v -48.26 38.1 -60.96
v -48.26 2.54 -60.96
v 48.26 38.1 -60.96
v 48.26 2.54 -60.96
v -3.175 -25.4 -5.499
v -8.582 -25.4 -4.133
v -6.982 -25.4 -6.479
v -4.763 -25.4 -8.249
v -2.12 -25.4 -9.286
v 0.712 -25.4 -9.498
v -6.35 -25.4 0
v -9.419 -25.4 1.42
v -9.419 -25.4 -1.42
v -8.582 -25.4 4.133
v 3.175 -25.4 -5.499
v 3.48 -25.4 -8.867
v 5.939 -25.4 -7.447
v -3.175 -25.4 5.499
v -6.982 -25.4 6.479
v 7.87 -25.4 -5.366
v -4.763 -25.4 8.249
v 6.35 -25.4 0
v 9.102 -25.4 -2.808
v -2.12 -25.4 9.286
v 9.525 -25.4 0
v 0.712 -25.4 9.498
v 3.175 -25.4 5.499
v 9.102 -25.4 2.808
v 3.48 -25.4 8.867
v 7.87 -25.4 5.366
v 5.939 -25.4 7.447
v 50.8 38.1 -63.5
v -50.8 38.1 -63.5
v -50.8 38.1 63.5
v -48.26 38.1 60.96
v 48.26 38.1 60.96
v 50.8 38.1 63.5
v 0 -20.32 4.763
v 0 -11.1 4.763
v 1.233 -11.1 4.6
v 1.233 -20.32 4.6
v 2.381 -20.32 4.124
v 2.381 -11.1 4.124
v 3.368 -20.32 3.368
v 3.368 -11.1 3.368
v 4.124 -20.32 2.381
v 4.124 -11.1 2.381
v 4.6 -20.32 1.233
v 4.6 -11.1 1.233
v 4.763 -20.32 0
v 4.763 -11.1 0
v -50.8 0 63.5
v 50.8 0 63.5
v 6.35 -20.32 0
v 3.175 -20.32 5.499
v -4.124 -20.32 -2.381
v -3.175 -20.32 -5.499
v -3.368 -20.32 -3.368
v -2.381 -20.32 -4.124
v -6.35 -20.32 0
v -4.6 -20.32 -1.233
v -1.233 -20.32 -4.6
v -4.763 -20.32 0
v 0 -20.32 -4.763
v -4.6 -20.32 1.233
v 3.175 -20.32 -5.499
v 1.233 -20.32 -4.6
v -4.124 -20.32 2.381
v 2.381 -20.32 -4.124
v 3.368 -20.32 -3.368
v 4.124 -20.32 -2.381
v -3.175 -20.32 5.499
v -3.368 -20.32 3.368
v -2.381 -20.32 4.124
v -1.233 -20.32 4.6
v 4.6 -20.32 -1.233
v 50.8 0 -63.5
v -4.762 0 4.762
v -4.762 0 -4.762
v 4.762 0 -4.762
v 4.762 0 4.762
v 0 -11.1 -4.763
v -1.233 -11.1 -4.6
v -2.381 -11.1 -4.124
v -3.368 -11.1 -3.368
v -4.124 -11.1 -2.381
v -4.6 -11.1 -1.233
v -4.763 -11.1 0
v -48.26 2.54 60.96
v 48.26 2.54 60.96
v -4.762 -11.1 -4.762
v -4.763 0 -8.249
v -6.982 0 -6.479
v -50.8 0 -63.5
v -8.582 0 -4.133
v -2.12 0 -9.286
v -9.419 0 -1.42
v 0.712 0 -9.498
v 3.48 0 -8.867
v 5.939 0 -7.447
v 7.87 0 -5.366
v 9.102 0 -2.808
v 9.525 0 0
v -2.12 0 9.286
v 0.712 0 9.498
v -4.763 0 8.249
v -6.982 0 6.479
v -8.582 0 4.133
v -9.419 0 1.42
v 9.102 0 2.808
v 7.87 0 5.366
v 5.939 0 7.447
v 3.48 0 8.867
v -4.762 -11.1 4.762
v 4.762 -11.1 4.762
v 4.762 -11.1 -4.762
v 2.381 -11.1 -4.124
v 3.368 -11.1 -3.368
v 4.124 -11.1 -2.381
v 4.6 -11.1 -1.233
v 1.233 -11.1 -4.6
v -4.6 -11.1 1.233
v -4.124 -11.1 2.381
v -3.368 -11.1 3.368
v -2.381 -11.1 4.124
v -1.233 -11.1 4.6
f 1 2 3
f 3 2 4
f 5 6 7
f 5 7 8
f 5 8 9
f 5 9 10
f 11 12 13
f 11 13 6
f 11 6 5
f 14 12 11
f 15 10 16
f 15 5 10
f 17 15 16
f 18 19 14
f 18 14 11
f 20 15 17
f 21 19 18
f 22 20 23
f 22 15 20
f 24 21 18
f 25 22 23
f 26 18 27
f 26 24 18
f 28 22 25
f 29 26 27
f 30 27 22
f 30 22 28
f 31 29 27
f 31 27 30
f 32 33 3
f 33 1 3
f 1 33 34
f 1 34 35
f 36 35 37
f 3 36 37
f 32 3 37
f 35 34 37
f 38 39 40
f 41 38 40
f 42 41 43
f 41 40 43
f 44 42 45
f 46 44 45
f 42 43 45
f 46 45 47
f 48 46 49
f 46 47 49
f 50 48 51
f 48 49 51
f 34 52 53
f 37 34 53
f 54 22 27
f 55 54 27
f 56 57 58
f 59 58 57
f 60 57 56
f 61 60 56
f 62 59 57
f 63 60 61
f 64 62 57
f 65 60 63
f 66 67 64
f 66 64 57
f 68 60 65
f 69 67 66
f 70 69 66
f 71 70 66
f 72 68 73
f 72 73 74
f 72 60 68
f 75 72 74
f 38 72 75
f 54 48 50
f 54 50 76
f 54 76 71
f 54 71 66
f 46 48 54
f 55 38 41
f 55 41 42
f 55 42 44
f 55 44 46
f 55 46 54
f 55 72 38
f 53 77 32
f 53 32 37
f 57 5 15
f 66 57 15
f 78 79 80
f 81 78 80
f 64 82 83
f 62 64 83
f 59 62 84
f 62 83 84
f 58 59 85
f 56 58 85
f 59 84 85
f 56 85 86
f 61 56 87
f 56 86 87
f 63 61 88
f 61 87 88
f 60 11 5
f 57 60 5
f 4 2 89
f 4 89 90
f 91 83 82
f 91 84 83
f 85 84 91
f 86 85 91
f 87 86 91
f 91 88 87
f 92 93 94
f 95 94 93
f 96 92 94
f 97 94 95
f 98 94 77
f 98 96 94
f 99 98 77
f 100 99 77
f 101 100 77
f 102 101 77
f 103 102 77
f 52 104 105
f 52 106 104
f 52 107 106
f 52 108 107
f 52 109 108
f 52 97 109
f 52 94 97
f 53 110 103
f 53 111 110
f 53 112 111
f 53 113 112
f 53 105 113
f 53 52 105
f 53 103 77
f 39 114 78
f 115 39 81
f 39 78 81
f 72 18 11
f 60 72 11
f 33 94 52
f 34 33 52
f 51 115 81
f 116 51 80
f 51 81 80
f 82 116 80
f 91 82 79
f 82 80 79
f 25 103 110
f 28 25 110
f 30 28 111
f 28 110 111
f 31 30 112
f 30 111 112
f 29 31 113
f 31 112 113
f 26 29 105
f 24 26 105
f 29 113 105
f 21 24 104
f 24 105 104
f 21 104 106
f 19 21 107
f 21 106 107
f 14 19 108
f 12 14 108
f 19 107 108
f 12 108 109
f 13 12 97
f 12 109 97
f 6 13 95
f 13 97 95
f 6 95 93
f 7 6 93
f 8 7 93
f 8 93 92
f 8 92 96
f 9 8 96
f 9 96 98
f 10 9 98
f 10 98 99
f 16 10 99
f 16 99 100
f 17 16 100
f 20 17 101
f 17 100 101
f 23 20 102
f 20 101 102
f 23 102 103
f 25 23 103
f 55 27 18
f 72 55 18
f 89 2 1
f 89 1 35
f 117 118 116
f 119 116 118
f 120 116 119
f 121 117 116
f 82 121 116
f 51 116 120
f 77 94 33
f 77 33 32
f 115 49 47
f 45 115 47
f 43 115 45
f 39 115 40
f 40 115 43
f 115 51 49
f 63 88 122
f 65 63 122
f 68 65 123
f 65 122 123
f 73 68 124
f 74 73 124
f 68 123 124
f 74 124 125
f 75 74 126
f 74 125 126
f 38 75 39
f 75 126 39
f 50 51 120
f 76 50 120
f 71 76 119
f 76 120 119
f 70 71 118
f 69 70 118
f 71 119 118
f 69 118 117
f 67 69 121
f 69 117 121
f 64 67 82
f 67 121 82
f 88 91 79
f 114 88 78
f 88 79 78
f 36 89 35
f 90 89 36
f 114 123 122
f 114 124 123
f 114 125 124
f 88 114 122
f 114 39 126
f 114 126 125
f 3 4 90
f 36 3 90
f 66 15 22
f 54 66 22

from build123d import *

# Parameters (mm, degrees)
F0_R         = 9.525
F1_DEPTH     = 25.4
F3_DEPTH     = 25.401
F4_DEPTH     = 11.0998
F6_DEPTH     = 5.08
F7_W         = 101.6
F7_H         = 127
F8_DEPTH     = 38.1
F9_T         = 2.54
F9_T3_DEPTH  = 10.16
F9_T5_DEPTH  = 11.43
F9_T7_DEPTH  = 11.43
F9_T9_DEPTH  = 11.43
F9_T11_DEPTH = 11.43
F9_T13_DEPTH = 11.43
F9_T15_DEPTH = 9.8425
F9_T17_DEPTH = 9.8425
F9_T19_DEPTH = 9.8425
F9_T21_DEPTH = 9.8425
F9_T23_DEPTH = 14.605
F9_T25_DEPTH = 16.1798
F9_T27_DEPTH = 14.605


# Not quite as in the source:
# - a shell that OpenCascade refuses in one call is made with other operations: the cavity is built on its own and cut out


with BuildPart() as f1:
    # F0 (on Front) → F1 (new body)
    with BuildSketch(Plane.XZ):
        Circle(F0_R)
    extrude(amount=F1_DEPTH)

    # F2 (on face) → F3 (cut, through all)
    with BuildSketch(Plane(origin=(0, 0, 0), x_dir=(-1, 0, 0), z_dir=(0, 1, 0))):
        with BuildLine():
            ThreePointArc((4.7625, 0), (3.3675960454, 3.3675960454), (0, 4.7625))
            ThreePointArc((0, 4.7625), (-3.3675960454, 3.3675960454), (-4.7625, 0))
            ThreePointArc((-4.7625, 0), (-3.3675960454, -3.3675960454), (0, -4.7625))
            ThreePointArc((0, -4.7625), (3.3675960454, -3.3675960454), (4.7625, 0))
        make_face()
    extrude(amount=-F3_DEPTH, mode=Mode.SUBTRACT)

    # F2 (on face) → F4 (cut)
    with BuildSketch(Plane(origin=(0, 0, 0), x_dir=(-1, 0, 0), z_dir=(0, 1, 0))):
        with BuildLine():
            Line((4.7625, 0), (4.7625, 4.7625))
            Line((4.7625, 4.7625), (0, 4.7625))
            ThreePointArc((0, 4.7625), (3.3675960454, 3.3675960454), (4.7625, 0))
        make_face()
        with BuildLine():
            ThreePointArc((-4.7625, 0), (-3.3675960454, 3.3675960454), (0, 4.7625))
            Line((0, 4.7625), (-4.7625, 4.7625))
            Line((-4.7625, 4.7625), (-4.7625, 0))
        make_face()
        with BuildLine():
            ThreePointArc((4.7625, 0), (3.3675960454, 3.3675960454), (0, 4.7625))
            ThreePointArc((0, 4.7625), (-3.3675960454, 3.3675960454), (-4.7625, 0))
            ThreePointArc((-4.7625, 0), (-3.3675960454, -3.3675960454), (0, -4.7625))
            ThreePointArc((0, -4.7625), (3.3675960454, -3.3675960454), (4.7625, 0))
        make_face()
        with BuildLine():
            Line((4.7625, -4.7625), (4.7625, 0))
            ThreePointArc((4.7625, 0), (3.3675960454, -3.3675960454), (0, -4.7625))
            Line((0, -4.7625), (4.7625, -4.7625))
        make_face()
        with BuildLine():
            ThreePointArc((0, -4.7625), (-3.3675960454, -3.3675960454), (-4.7625, 0))
            Line((-4.7625, 0), (-4.7625, -4.7625))
            Line((-4.7625, -4.7625), (0, -4.7625))
        make_face()
    extrude(amount=-F4_DEPTH, mode=Mode.SUBTRACT)

    # F5 (on face) → F6 (cut)
    with BuildSketch(Plane.XZ.offset(25.4)):
        Polygon((3.175, 5.499261314), (-3.175, 5.499261314), (-6.35, 0), (-3.175, -5.499261314), (3.175, -5.499261314), (6.35, 0), align=None)
    extrude(amount=-F6_DEPTH, mode=Mode.SUBTRACT)

    # F7 (on Front) → F8 (join)
    with BuildSketch(Plane.XZ):
        Rectangle(F7_W, F7_H)
    extrude(amount=-F8_DEPTH)

    # F9: shell of thickness 2.54, made by hand


with BuildPart() as f9_core1:
    # F9_t2: copy of F1
    add(f1.part)

    # the walls: a layer under each face that stays
    f9_faces = [f9_core1.faces().sort_by_distance(p)[0] for p in [
        (50.8, 19.05, 0),
        (0, 19.05, -63.5),
        (0, 19.05, 63.5),
        (-33.8666666667, 0, -42.3333333333),
        (-50.8, 19.05, 0),
        (-9.525, -12.7, 0),
        (-6.35, -25.4, -6.35),
        (0, -22.86, 5.499261314),
        (-4.7625, -22.86, 2.749630657),
        (-4.7625, -22.86, -2.749630657),
        (0, -22.86, -5.499261314),
        (4.7625, -22.86, -2.749630657),
        (4.7625, -22.86, 2.749630657),
        (-5.4428571429, -20.32, 0),
        (0, -15.7099, 4.7625),
        (-3.96875, -11.0998, -3.96875),
        (-3.96875, -11.0998, 3.96875),
        (3.96875, -11.0998, 3.96875),
        (3.96875, -11.0998, -3.96875),
        (-4.7625, -5.5499, 0),
        (0, -5.5499, -4.7625),
        (0, -5.5499, 4.7625),
        (4.7625, -5.5499, 0),
        (0, 0, 0),
    ]]
    thicken(f9_faces, amount=-F9_T, mode=Mode.SUBTRACT)

    # F9_s4 → F9_t3 (cut)
    with BuildSketch(Plane.XZ.offset(17.78)):
        Polygon((3.1530029547, 5.461161314), (3.175, 8.039261314), (4.6414696837, 8.039261314), (5.3747045256, 6.769261314), align=None)
        Polygon((-3.1530029547, 5.461161314), (-3.175, 8.039261314), (-4.6414696837, 8.039261314), (-5.3747045256, 6.769261314), align=None)
        Polygon((-6.3060059095, 0), (-8.5497045256, 1.27), (-9.2829393675, 0), (-8.5497045256, -1.27), align=None)
        Polygon((-3.1530029547, -5.461161314), (-5.3747045256, -6.769261314), (-4.6414696837, -8.039261314), (-3.175, -8.039261314), align=None)
        Polygon((3.1530029547, -5.461161314), (3.175, -8.039261314), (4.6414696837, -8.039261314), (5.3747045256, -6.769261314), align=None)
        Polygon((6.3060059095, 0), (8.5497045256, -1.27), (9.2829393675, 0), (8.5497045256, 1.27), align=None)
    extrude(amount=F9_T3_DEPTH, mode=Mode.SUBTRACT)

    # F9_s6 → F9_t5 (cut)
    with BuildSketch(Plane.YZ.offset(-5.715)):
        Polygon((-20.3454, 5.473861314), (-20.32, 8.039261314), (-17.78, 8.039261314), (-17.78, 5.499261314), align=None)
        Polygon((-20.3454, -5.473861314), (-20.32, -8.039261314), (-17.78, -8.039261314), (-17.78, -5.499261314), align=None)
    extrude(amount=F9_T5_DEPTH, mode=Mode.SUBTRACT)

    # F9_s8 → F9_t7 (cut)
    with BuildSketch(Plane(origin=(2.8575, 0, 4.9493351826), x_dir=(0, 1, 0), z_dir=(-0.5, 0, -0.8660254038))):
        Polygon((-20.3454, -5.473861314), (-20.32, -8.039261314), (-17.78, -8.039261314), (-17.78, -5.499261314), align=None)
    extrude(amount=F9_T7_DEPTH, mode=Mode.SUBTRACT)

    # F9_s10 → F9_t9 (cut)
    with BuildSketch(Plane(origin=(-2.8575, 0, 4.9493351826), x_dir=(0, 1, 0), z_dir=(0.5, 0, -0.8660254038))):
        Polygon((-20.3454, -5.473861314), (-20.32, -8.039261314), (-17.78, -8.039261314), (-17.78, -5.499261314), align=None)
    extrude(amount=F9_T9_DEPTH, mode=Mode.SUBTRACT)

    # F9_s12 → F9_t11 (cut)
    with BuildSketch(Plane(origin=(-2.8575, 0, -4.9493351826), x_dir=(0, 1, 0), z_dir=(0.5, 0, 0.8660254038))):
        Polygon((-20.3454, -5.473861314), (-20.32, -8.039261314), (-17.78, -8.039261314), (-17.78, -5.499261314), align=None)
    extrude(amount=F9_T11_DEPTH, mode=Mode.SUBTRACT)

    # F9_s14 → F9_t13 (cut)
    with BuildSketch(Plane(origin=(2.8575, 0, -4.9493351826), x_dir=(0, 1, 0), z_dir=(-0.5, 0, 0.8660254038))):
        Polygon((-20.3454, -5.473861314), (-20.32, -8.039261314), (-17.78, -8.039261314), (-17.78, -5.499261314), align=None)
    extrude(amount=F9_T13_DEPTH, mode=Mode.SUBTRACT)

    # F9_s16 → F9_t15 (cut)
    with BuildSketch(Plane.XY.offset(-7.3025)):
        Polygon((-4.7371, -11.0744), (-4.7625, -13.6398), (-7.3025, -13.6398), (-7.3025, -11.0998), align=None)
        Polygon((4.7371, -11.0744), (4.7625, -13.6398), (7.3025, -13.6398), (7.3025, -11.0998), align=None)
    extrude(amount=F9_T15_DEPTH, mode=Mode.SUBTRACT)

    # F9_s18 → F9_t17 (cut)
    with BuildSketch(Plane.YZ.offset(-7.3025)):
        Polygon((-11.0744, -4.7371), (-13.6398, -4.7625), (-13.6398, -7.3025), (-11.0998, -7.3025), align=None)
        Polygon((-11.0744, 4.7371), (-13.6398, 4.7625), (-13.6398, 7.3025), (-11.0998, 7.3025), align=None)
    extrude(amount=F9_T17_DEPTH, mode=Mode.SUBTRACT)

    # F9_s20 → F9_t19 (cut)
    with BuildSketch(Plane.XY.offset(-2.54)):
        Polygon((-4.7371, -11.0744), (-4.7625, -13.6398), (-7.3025, -13.6398), (-7.3025, -11.0998), align=None)
        Polygon((4.7371, -11.0744), (4.7625, -13.6398), (7.3025, -13.6398), (7.3025, -11.0998), align=None)
    extrude(amount=F9_T19_DEPTH, mode=Mode.SUBTRACT)

    # F9_s22 → F9_t21 (cut)
    with BuildSketch(Plane.YZ.offset(-2.54)):
        Polygon((-11.0744, 4.7371), (-13.6398, 4.7625), (-13.6398, 7.3025), (-11.0998, 7.3025), align=None)
        Polygon((-11.0744, -4.7371), (-13.6398, -4.7625), (-13.6398, -7.3025), (-11.0998, -7.3025), align=None)
    extrude(amount=F9_T21_DEPTH, mode=Mode.SUBTRACT)

    # F9_s24 → F9_t23 (cut)
    with BuildSketch(Plane.XY.offset(-7.3025)):
        Polygon((-4.7371, -0.0254), (-7.3025, 0), (-7.3025, 2.54), (-4.7625, 2.54), align=None)
        Polygon((4.7371, -0.0254), (7.3025, 0), (7.3025, 2.54), (4.7625, 2.54), align=None)
    extrude(amount=F9_T23_DEPTH, mode=Mode.SUBTRACT)

    # F9_s26 → F9_t25 (cut)
    with BuildSketch(Plane.XZ.offset(-2.54)):
        Polygon((-4.7371, -4.7371), (-7.3025, -4.7625), (-7.3025, -7.3025), (-4.7625, -7.3025), align=None)
        Polygon((-4.7371, 4.7371), (-7.3025, 4.7625), (-7.3025, 7.3025), (-4.7625, 7.3025), align=None)
        Polygon((4.7371, -4.7371), (4.7625, -7.3025), (7.3025, -7.3025), (7.3025, -4.7625), align=None)
        Polygon((4.7371, 4.7371), (4.7625, 7.3025), (7.3025, 7.3025), (7.3025, 4.7625), align=None)
    extrude(amount=F9_T25_DEPTH, mode=Mode.SUBTRACT)

    # F9_s28 → F9_t27 (cut)
    with BuildSketch(Plane.YZ.offset(-7.3025)):
        Polygon((-0.0254, -4.7371), (0, -7.3025), (2.54, -7.3025), (2.54, -4.7625), align=None)
        Polygon((-0.0254, 4.7371), (0, 7.3025), (2.54, 7.3025), (2.54, 4.7625), align=None)
    extrude(amount=F9_T27_DEPTH, mode=Mode.SUBTRACT)

    # F9_s29 → F9_t30 (revolve, cut)
    with BuildSketch(Plane.XY):
        Polygon((9.5504, -0.0254), (9.525, 2.54), (6.985, 2.54), (6.985, 0), align=None)
    revolve(axis=Axis((0, 0, 0), (0, -1, 0)), mode=Mode.SUBTRACT)


with BuildPart() as f1_1:
    add(f1.part)

    # what is left inside the walls is the cavity
    f9_cavity = [f9_core1.part.solids().sort_by_distance(p)[0] for p in [
        (0, 2.5654, -20.32),
    ]]
    add(f9_cavity, mode=Mode.SUBTRACT)


solid = f1_1.part
